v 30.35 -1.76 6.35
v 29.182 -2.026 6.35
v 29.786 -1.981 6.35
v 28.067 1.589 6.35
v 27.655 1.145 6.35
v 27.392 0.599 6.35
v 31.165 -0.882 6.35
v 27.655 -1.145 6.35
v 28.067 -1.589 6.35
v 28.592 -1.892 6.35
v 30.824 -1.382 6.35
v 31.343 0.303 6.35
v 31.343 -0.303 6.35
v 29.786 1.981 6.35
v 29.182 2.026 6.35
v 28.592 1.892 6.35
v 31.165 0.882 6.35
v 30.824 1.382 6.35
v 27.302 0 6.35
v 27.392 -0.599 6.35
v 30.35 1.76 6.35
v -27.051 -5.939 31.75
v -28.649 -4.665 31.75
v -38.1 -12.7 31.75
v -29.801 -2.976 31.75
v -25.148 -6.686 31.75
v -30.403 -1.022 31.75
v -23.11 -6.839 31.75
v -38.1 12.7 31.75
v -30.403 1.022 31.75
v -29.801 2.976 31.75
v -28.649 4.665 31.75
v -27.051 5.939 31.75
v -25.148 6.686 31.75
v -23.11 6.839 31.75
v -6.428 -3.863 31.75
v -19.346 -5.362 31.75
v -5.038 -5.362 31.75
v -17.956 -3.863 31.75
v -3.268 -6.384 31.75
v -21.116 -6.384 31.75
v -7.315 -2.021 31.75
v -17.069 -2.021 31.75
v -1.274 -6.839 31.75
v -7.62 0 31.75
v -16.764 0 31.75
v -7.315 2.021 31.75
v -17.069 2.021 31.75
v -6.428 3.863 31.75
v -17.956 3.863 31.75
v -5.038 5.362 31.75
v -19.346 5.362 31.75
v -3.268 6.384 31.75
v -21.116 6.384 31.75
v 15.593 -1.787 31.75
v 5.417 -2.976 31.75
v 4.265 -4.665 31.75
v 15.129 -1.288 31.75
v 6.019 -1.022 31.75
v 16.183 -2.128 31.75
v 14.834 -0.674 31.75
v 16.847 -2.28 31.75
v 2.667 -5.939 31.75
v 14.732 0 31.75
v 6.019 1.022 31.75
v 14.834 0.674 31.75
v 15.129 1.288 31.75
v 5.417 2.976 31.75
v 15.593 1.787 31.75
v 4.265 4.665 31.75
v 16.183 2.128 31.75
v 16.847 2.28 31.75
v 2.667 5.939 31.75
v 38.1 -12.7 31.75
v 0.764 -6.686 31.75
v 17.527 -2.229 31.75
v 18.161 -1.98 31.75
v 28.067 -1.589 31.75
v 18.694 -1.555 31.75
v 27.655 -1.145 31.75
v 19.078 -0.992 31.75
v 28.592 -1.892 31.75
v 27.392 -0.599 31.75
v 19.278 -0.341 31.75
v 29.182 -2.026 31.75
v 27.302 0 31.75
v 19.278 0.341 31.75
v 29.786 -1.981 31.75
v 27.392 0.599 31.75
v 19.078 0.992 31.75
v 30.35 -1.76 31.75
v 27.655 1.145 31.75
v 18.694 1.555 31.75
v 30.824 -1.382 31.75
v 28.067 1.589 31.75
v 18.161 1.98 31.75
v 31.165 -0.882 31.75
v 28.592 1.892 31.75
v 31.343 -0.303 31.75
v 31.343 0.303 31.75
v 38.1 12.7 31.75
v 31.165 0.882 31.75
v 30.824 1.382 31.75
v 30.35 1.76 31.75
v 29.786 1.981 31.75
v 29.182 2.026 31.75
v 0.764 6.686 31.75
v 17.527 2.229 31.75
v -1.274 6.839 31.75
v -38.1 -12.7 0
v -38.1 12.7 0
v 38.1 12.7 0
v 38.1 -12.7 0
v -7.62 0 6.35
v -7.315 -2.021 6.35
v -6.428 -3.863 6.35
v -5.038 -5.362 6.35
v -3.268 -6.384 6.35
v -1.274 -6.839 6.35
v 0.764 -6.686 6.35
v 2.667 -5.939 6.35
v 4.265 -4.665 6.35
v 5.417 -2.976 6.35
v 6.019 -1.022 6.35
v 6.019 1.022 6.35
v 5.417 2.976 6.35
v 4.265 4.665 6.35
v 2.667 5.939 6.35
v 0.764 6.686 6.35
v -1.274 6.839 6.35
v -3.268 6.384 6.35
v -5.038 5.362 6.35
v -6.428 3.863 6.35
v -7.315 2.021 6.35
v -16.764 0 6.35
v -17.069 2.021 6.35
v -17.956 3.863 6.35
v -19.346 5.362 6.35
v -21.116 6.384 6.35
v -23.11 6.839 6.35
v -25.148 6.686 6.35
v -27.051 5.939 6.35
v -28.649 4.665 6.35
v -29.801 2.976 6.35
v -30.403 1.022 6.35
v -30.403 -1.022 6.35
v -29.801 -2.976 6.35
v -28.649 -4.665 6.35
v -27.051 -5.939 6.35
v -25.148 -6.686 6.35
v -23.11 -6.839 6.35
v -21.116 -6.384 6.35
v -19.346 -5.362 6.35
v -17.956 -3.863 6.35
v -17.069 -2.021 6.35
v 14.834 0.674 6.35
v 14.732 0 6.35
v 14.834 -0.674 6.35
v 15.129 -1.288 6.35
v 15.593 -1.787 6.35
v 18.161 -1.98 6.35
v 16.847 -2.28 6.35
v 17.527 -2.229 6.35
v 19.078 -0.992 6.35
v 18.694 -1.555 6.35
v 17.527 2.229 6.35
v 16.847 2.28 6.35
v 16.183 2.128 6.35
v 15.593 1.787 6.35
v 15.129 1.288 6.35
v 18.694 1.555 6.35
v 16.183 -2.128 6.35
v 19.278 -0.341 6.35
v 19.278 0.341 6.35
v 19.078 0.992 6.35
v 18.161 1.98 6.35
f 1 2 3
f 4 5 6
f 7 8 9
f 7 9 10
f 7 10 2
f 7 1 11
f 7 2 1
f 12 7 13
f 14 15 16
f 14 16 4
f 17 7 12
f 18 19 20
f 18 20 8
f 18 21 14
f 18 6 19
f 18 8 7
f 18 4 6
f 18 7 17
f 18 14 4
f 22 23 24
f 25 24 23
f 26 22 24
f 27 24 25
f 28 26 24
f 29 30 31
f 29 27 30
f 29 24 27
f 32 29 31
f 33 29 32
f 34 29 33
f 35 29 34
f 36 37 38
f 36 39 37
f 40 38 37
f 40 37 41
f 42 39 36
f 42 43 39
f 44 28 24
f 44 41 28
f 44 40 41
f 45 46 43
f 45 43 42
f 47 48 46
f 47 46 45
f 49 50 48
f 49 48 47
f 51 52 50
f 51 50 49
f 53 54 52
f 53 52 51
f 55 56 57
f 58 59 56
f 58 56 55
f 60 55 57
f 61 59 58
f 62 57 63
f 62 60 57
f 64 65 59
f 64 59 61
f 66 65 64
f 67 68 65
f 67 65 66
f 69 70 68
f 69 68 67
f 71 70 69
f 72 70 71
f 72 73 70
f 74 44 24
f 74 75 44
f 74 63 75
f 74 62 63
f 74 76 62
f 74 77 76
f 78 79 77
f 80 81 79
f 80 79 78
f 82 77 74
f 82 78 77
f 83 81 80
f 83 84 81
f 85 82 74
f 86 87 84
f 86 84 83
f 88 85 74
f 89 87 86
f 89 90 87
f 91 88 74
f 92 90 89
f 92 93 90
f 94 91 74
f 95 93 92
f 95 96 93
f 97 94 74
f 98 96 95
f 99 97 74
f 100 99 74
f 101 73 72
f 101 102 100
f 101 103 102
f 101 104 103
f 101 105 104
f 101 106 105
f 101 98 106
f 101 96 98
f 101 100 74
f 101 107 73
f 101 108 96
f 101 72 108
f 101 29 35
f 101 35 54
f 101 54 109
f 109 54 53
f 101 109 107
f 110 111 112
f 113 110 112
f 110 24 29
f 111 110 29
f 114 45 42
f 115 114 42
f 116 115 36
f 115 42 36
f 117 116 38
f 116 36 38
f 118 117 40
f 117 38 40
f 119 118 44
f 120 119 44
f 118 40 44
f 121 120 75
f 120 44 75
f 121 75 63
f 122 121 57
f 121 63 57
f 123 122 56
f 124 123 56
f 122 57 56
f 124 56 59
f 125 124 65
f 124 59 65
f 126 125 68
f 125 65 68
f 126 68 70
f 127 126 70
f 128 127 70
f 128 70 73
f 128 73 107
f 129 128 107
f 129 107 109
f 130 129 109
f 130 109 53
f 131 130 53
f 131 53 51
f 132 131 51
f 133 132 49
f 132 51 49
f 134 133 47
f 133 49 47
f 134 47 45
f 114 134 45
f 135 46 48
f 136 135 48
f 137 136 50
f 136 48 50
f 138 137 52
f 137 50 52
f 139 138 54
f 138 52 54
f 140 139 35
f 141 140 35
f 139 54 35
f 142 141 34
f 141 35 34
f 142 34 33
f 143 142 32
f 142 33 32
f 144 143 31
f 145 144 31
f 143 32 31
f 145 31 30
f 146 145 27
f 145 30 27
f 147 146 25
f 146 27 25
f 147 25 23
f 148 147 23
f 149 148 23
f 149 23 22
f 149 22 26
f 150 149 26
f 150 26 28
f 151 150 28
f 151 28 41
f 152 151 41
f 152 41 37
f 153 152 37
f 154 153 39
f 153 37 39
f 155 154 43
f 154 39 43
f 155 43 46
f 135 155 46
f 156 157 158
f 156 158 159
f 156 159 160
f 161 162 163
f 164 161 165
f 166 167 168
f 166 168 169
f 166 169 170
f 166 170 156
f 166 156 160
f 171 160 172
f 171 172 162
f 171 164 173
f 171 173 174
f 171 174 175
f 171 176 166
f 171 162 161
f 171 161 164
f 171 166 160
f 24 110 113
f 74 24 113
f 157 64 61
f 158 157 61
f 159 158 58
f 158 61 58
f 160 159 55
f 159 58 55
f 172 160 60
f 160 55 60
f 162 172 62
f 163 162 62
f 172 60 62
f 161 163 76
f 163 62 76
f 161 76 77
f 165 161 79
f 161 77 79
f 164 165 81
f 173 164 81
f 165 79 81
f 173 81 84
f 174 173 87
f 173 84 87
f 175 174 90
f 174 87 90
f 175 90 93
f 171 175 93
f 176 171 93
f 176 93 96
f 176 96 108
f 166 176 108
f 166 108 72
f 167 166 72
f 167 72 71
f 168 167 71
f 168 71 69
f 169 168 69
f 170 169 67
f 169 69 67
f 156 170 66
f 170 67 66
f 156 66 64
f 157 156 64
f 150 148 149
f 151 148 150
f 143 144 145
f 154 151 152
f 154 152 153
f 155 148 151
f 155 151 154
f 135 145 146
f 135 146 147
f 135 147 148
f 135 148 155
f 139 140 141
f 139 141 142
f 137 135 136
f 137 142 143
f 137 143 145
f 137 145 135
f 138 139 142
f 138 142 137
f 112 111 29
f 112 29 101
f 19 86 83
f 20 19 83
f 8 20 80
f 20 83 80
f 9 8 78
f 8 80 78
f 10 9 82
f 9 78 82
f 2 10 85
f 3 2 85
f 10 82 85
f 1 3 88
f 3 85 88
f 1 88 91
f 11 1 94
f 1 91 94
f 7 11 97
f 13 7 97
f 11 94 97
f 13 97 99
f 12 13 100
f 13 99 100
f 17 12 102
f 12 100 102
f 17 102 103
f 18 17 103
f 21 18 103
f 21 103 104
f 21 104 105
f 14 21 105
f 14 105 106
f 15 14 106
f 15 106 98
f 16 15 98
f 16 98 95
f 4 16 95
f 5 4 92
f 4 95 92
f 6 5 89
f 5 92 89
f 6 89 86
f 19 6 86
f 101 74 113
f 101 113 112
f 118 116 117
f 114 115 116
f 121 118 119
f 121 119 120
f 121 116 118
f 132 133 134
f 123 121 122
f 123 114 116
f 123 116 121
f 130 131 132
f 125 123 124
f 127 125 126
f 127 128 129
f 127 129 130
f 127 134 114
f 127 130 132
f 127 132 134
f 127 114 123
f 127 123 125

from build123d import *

# Parameters (mm, degrees)
F0_W     = 76.2
F0_H     = 25.4
F1_DEPTH = 31.75
F3_DEPTH = 25.4


with BuildPart() as f1:
    # F0 (on Top) → F1 (new body)
    with BuildSketch(Plane.XY):
        Rectangle(F0_W, F0_H)
    extrude(amount=F1_DEPTH)

    # F2 (on face) → F3 (cut)
    with BuildSketch(Plane.XY.offset(31.75)):
        with BuildLine():
            Line((-7.62, 0), (0, 0))
            Line((0, 0), (6.096, 0))
            ThreePointArc((6.096, 0), (-0.762, 6.858), (-7.62, 0))
        make_face()
        with BuildLine():
            Line((6.096, 0), (0, 0))
            Line((0, 0), (-7.62, 0))
            ThreePointArc((-7.62, 0), (-0.762, -6.858), (6.096, 0))
        make_face()
        with BuildLine():
            ThreePointArc((31.366032, 0), (29.334032, 2.032), (27.302032, 0))
            Line((27.302032, 0), (31.366032, 0))
        make_face()
        with BuildLine():
            Line((31.366032, 0), (27.302032, 0))
            ThreePointArc((27.302032, 0), (29.334032, -2.032), (31.366032, 0))
        make_face()
        with BuildLine():
            ThreePointArc((19.304, 0), (17.018, 2.286), (14.732, 0))
            Line((14.732, 0), (19.304, 0))
        make_face()
        with BuildLine():
            Line((19.304, 0), (14.732, 0))
            ThreePointArc((14.732, 0), (17.018, -2.286), (19.304, 0))
        make_face()
        with BuildLine():
            ThreePointArc((-30.48, 0), (-23.622, -6.858), (-16.764, 0))
            Line((-16.764, 0), (-30.48, 0))
        make_face()
        with BuildLine():
            Line((-30.48, 0), (-16.764, 0))
            ThreePointArc((-16.764, 0), (-23.622, 6.858), (-30.48, 0))
        make_face()
    extrude(amount=-F3_DEPTH, mode=Mode.SUBTRACT)


solid = f1.part
